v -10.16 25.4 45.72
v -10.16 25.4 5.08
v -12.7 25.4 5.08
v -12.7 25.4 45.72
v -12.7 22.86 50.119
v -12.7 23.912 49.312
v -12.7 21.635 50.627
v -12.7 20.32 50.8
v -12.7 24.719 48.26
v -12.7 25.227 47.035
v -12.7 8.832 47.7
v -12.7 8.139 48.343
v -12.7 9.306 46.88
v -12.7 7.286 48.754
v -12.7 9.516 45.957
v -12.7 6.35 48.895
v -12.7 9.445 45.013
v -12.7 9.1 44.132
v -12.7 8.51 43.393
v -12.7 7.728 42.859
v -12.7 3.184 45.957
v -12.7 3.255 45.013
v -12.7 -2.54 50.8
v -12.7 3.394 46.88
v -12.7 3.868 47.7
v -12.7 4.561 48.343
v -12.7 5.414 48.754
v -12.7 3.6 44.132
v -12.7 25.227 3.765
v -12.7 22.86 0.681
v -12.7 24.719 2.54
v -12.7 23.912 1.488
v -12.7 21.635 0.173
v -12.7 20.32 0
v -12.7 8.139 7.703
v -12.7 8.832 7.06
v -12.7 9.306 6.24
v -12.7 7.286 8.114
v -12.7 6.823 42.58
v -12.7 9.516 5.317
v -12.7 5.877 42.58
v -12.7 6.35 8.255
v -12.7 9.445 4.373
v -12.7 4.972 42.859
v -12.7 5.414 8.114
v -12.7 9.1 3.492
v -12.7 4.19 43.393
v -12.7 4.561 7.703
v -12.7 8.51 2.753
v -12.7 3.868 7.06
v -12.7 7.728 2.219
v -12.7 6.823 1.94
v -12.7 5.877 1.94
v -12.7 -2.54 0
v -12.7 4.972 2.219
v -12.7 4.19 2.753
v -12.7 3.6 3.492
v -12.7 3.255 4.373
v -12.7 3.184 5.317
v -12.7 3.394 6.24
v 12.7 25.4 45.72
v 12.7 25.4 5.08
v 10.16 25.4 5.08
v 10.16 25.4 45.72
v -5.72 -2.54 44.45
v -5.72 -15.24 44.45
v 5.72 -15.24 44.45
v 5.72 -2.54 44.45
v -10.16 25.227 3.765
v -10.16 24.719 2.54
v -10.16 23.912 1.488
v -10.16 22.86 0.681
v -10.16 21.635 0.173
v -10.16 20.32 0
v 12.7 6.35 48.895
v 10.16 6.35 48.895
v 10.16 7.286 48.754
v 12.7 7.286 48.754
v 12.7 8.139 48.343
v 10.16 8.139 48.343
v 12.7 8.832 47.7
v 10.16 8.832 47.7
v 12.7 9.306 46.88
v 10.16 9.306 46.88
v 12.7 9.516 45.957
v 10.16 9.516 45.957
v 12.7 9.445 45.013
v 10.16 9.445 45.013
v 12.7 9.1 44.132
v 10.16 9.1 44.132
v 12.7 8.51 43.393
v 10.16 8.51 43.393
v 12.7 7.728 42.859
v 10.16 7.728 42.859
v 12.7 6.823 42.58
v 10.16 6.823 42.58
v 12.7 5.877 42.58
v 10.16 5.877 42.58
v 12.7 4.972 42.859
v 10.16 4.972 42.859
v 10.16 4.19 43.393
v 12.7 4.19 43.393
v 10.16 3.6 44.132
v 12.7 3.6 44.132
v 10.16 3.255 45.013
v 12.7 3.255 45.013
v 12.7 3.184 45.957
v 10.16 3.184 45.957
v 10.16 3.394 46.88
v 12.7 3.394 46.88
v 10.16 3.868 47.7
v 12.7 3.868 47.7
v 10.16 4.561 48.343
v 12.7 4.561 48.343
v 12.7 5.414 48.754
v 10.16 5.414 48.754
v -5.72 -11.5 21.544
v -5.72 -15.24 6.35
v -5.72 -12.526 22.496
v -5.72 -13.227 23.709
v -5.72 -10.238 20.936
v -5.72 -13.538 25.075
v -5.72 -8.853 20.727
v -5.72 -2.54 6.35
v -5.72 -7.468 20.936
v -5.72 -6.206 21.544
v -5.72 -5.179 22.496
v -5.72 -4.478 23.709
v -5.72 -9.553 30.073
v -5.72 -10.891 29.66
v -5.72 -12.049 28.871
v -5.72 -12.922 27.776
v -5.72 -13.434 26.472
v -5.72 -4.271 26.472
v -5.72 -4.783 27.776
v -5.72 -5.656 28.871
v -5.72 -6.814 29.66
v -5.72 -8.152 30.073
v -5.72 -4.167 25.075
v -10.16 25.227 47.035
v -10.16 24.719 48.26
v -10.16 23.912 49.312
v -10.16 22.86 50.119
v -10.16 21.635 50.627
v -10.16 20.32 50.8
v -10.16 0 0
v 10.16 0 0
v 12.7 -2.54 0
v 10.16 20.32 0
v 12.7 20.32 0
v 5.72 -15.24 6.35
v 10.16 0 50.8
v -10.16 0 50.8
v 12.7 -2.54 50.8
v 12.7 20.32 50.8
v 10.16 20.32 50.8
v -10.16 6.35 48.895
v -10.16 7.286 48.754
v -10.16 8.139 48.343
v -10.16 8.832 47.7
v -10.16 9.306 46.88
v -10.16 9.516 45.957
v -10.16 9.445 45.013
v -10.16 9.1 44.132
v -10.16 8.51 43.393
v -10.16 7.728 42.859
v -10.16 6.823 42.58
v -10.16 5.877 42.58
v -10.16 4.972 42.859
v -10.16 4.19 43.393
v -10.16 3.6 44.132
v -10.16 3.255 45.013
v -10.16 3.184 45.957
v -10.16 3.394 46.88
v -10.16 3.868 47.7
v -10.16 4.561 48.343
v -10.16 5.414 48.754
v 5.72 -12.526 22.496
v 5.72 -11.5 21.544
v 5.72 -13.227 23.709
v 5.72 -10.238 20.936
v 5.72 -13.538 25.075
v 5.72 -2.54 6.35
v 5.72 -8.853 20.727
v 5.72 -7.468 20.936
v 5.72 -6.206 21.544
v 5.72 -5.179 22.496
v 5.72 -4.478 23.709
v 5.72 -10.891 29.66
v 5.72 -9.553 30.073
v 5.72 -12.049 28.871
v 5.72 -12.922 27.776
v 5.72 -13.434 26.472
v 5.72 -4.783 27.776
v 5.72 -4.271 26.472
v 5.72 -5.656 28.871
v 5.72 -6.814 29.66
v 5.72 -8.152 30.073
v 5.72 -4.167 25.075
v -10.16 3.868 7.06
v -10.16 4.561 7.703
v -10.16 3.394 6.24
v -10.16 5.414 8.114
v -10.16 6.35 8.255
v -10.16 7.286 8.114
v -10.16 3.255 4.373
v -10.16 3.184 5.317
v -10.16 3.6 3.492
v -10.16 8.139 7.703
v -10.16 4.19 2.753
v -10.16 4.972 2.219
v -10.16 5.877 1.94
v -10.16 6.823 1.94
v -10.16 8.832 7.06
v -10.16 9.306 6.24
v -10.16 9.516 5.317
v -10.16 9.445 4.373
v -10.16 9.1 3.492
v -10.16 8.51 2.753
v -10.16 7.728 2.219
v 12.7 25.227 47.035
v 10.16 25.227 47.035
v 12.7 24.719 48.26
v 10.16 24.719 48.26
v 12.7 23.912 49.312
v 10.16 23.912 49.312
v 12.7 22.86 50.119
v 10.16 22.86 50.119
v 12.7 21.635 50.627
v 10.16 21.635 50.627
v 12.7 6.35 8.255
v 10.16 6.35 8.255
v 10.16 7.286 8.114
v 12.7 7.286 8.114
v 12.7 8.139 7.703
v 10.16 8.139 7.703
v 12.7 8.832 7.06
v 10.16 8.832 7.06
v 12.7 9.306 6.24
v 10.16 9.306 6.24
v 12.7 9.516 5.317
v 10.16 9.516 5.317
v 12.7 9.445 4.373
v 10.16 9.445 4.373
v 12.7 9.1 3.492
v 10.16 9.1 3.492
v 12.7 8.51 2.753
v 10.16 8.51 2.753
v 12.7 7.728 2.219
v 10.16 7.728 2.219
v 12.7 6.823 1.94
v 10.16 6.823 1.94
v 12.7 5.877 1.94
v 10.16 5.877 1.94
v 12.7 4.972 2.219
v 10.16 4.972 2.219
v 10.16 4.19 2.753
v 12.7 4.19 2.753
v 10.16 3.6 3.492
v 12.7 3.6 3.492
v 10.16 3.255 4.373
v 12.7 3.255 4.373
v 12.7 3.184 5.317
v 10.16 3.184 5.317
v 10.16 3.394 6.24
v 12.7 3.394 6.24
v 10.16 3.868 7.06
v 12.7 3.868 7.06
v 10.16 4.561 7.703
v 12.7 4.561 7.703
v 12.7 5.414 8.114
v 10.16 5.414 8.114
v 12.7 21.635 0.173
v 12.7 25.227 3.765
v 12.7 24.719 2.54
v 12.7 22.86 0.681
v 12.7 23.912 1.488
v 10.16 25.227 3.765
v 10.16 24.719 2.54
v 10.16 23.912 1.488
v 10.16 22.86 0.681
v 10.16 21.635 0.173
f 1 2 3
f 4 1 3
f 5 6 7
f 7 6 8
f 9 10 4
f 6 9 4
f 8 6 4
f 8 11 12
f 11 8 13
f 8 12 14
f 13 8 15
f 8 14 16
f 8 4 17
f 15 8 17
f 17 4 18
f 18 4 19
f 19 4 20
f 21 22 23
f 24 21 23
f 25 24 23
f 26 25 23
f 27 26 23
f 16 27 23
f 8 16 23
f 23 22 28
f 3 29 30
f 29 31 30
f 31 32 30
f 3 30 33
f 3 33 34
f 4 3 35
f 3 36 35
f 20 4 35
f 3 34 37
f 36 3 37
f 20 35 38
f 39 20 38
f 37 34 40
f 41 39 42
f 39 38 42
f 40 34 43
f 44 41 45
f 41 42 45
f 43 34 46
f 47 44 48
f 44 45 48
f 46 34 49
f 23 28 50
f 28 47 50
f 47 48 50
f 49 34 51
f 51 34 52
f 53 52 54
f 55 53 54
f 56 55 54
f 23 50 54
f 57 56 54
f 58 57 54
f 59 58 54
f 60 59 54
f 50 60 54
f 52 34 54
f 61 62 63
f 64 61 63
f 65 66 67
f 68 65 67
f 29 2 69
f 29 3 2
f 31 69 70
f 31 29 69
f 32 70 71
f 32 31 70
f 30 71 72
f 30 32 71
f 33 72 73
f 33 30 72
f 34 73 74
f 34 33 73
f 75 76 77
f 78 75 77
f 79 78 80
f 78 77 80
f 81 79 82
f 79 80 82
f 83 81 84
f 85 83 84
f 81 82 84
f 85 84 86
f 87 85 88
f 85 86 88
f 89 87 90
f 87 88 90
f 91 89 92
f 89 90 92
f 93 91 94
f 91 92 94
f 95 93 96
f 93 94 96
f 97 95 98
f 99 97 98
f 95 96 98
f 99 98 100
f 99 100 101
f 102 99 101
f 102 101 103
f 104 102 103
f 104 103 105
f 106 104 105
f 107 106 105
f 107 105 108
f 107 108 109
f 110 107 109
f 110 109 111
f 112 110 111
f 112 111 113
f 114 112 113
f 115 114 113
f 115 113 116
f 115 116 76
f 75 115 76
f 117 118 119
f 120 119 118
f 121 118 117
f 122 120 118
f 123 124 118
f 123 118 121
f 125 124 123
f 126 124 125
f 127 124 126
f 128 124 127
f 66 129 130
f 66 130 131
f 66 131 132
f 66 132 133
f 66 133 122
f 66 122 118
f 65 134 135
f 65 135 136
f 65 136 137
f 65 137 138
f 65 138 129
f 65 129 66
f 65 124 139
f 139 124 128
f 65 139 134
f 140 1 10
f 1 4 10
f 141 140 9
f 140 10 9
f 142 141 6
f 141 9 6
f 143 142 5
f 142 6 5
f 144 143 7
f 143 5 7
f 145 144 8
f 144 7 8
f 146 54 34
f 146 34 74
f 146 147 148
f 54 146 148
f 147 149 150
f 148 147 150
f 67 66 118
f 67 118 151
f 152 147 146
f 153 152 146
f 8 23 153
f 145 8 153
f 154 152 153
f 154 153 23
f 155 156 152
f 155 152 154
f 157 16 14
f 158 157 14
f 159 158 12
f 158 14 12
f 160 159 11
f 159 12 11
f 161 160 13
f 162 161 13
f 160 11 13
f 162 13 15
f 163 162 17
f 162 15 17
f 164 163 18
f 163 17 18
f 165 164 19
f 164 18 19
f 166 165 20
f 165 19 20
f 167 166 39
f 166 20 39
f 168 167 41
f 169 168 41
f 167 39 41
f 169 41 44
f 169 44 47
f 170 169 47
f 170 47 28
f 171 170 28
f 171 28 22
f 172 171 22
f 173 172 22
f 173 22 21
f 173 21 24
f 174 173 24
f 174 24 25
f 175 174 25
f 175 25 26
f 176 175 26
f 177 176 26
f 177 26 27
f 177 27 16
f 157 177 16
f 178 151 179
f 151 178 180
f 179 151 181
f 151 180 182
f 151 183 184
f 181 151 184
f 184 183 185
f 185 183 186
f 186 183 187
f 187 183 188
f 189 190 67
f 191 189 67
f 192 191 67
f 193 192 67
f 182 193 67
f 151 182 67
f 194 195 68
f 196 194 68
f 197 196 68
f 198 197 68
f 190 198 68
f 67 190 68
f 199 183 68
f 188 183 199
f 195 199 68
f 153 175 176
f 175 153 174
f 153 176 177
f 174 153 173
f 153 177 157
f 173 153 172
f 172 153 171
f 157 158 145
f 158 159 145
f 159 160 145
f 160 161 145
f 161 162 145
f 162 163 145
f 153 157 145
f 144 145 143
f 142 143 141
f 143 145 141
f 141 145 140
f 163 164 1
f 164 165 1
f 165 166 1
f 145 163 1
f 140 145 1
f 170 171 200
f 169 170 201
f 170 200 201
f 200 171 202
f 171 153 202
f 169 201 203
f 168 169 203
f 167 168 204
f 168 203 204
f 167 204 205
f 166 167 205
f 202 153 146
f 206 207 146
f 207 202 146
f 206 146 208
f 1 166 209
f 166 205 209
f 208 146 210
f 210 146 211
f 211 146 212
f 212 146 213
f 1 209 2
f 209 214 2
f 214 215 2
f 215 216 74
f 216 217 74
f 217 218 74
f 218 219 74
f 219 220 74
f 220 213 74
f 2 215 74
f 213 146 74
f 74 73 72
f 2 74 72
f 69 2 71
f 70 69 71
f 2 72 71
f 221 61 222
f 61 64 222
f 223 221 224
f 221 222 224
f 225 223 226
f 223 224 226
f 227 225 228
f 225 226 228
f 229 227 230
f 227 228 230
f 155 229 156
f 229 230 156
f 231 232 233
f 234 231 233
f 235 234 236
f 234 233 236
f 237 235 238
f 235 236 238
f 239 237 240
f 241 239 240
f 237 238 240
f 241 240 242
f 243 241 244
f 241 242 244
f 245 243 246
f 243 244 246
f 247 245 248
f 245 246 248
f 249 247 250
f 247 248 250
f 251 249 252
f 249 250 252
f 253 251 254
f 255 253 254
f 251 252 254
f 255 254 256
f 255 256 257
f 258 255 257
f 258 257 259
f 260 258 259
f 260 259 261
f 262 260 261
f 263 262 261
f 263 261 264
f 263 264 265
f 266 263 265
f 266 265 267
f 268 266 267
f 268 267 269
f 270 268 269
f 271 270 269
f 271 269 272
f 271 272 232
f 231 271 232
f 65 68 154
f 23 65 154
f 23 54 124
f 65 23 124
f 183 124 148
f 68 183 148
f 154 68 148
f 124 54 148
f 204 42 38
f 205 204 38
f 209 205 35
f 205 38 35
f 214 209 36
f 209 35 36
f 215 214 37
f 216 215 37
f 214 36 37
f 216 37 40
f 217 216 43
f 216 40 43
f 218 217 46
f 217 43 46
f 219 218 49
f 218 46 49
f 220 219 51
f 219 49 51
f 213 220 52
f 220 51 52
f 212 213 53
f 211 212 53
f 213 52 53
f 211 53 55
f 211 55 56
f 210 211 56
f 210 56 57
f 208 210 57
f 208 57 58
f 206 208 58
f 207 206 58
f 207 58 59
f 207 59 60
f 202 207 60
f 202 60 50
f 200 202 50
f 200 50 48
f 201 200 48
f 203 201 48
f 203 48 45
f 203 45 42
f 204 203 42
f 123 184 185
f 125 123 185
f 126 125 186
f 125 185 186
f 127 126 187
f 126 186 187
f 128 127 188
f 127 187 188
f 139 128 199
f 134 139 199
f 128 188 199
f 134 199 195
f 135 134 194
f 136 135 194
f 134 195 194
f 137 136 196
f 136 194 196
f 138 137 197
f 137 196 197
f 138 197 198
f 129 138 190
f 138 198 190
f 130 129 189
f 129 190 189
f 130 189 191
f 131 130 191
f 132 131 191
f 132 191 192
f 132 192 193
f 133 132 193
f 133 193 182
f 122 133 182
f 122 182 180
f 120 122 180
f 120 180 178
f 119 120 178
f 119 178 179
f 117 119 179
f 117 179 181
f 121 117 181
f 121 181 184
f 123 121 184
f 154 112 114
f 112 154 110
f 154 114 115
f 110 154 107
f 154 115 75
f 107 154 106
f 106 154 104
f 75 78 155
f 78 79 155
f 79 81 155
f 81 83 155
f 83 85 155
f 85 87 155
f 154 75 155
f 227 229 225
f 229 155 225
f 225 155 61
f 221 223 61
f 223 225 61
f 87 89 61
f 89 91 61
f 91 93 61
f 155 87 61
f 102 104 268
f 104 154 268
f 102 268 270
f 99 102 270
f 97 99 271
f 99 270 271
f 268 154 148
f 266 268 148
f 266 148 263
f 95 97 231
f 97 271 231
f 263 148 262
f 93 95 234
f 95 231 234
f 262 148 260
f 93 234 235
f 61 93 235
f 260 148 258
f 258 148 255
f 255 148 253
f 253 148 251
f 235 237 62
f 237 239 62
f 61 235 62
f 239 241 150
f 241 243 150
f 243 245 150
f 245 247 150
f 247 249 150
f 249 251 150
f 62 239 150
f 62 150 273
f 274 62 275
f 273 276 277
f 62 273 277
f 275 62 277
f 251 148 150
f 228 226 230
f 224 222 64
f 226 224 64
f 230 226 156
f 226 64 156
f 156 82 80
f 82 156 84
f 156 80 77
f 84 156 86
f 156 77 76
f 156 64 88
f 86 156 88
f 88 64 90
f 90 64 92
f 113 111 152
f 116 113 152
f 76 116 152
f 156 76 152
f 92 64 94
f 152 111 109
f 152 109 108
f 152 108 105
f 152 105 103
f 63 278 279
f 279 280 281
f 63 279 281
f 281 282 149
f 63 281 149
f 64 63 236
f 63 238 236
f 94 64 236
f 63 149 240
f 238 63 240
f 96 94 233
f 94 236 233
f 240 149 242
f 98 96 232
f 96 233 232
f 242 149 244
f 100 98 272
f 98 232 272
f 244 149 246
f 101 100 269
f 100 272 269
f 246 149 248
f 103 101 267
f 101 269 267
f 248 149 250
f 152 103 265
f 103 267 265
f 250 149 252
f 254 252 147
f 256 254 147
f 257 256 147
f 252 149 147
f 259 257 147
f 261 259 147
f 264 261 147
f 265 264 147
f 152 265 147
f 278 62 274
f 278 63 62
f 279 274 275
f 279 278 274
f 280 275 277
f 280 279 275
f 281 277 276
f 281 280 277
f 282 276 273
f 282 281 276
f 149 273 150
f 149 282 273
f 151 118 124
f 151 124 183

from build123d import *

# Parameters (mm, degrees)
EXTRUDE_THIN1_DEPTH = 50.8
FILLET1_R           = 5.08
SKETCH2_R           = 3.175
CUT_EXTRUDE1_DEPTH  = 63.217039467
SKETCH3_W           = 11.44
SKETCH3_H           = 38.1
BOSS_EXTRUDE1_DEPTH = 12.7
SKETCH4_R           = 4.699
CUT_EXTRUDE2_DEPTH  = 60.708428216


with BuildPart() as part:
    # Sketch1 → Extrude-Thin1 (new body)
    with BuildSketch(Plane.XY):
        Polygon((10.16, 25.4), (10.16, 0), (-10.16, 0), (-10.16, 25.4), (-12.7, 25.4), (-12.7, -2.54), (12.7, -2.54), (12.7, 25.4), align=None)
    extrude(amount=EXTRUDE_THIN1_DEPTH)

    # Fillet1
    fillet1_edges = [part.edges().sort_by_distance(p)[0] for p in [
        (-11.43, 25.4, 50.8),
        (-11.43, 25.4, 0),
        (11.43, 25.4, 50.8),
        (11.43, 25.4, 0),
    ]]
    fillet(fillet1_edges, radius=FILLET1_R)

    # Sketch2 → Cut-Extrude1 (cut, through all)
    with BuildSketch(Plane.ZY.offset(12.7)):
        with Locations((45.72, 6.35)):
            Circle(SKETCH2_R)
        with Locations((5.08, 6.35)):
            Circle(SKETCH2_R)
    extrude(amount=-CUT_EXTRUDE1_DEPTH, mode=Mode.SUBTRACT)

    # Sketch3 → Boss-Extrude1 (add)
    with BuildSketch(Plane.XZ.offset(2.54)):
        with Locations((0, 25.4)):
            Rectangle(SKETCH3_W, SKETCH3_H)
    extrude(amount=BOSS_EXTRUDE1_DEPTH)

    # Sketch4 → Cut-Extrude2 (cut, through all)
    with BuildSketch(Plane(origin=(5.72, 0, 0), x_dir=(0, 0, -1), z_dir=(1, 0, 0))):
        with Locations((-25.426069342, -8.852606466)):
            Circle(SKETCH4_R)
    extrude(amount=-CUT_EXTRUDE2_DEPTH, mode=Mode.SUBTRACT)


solid = part.part
